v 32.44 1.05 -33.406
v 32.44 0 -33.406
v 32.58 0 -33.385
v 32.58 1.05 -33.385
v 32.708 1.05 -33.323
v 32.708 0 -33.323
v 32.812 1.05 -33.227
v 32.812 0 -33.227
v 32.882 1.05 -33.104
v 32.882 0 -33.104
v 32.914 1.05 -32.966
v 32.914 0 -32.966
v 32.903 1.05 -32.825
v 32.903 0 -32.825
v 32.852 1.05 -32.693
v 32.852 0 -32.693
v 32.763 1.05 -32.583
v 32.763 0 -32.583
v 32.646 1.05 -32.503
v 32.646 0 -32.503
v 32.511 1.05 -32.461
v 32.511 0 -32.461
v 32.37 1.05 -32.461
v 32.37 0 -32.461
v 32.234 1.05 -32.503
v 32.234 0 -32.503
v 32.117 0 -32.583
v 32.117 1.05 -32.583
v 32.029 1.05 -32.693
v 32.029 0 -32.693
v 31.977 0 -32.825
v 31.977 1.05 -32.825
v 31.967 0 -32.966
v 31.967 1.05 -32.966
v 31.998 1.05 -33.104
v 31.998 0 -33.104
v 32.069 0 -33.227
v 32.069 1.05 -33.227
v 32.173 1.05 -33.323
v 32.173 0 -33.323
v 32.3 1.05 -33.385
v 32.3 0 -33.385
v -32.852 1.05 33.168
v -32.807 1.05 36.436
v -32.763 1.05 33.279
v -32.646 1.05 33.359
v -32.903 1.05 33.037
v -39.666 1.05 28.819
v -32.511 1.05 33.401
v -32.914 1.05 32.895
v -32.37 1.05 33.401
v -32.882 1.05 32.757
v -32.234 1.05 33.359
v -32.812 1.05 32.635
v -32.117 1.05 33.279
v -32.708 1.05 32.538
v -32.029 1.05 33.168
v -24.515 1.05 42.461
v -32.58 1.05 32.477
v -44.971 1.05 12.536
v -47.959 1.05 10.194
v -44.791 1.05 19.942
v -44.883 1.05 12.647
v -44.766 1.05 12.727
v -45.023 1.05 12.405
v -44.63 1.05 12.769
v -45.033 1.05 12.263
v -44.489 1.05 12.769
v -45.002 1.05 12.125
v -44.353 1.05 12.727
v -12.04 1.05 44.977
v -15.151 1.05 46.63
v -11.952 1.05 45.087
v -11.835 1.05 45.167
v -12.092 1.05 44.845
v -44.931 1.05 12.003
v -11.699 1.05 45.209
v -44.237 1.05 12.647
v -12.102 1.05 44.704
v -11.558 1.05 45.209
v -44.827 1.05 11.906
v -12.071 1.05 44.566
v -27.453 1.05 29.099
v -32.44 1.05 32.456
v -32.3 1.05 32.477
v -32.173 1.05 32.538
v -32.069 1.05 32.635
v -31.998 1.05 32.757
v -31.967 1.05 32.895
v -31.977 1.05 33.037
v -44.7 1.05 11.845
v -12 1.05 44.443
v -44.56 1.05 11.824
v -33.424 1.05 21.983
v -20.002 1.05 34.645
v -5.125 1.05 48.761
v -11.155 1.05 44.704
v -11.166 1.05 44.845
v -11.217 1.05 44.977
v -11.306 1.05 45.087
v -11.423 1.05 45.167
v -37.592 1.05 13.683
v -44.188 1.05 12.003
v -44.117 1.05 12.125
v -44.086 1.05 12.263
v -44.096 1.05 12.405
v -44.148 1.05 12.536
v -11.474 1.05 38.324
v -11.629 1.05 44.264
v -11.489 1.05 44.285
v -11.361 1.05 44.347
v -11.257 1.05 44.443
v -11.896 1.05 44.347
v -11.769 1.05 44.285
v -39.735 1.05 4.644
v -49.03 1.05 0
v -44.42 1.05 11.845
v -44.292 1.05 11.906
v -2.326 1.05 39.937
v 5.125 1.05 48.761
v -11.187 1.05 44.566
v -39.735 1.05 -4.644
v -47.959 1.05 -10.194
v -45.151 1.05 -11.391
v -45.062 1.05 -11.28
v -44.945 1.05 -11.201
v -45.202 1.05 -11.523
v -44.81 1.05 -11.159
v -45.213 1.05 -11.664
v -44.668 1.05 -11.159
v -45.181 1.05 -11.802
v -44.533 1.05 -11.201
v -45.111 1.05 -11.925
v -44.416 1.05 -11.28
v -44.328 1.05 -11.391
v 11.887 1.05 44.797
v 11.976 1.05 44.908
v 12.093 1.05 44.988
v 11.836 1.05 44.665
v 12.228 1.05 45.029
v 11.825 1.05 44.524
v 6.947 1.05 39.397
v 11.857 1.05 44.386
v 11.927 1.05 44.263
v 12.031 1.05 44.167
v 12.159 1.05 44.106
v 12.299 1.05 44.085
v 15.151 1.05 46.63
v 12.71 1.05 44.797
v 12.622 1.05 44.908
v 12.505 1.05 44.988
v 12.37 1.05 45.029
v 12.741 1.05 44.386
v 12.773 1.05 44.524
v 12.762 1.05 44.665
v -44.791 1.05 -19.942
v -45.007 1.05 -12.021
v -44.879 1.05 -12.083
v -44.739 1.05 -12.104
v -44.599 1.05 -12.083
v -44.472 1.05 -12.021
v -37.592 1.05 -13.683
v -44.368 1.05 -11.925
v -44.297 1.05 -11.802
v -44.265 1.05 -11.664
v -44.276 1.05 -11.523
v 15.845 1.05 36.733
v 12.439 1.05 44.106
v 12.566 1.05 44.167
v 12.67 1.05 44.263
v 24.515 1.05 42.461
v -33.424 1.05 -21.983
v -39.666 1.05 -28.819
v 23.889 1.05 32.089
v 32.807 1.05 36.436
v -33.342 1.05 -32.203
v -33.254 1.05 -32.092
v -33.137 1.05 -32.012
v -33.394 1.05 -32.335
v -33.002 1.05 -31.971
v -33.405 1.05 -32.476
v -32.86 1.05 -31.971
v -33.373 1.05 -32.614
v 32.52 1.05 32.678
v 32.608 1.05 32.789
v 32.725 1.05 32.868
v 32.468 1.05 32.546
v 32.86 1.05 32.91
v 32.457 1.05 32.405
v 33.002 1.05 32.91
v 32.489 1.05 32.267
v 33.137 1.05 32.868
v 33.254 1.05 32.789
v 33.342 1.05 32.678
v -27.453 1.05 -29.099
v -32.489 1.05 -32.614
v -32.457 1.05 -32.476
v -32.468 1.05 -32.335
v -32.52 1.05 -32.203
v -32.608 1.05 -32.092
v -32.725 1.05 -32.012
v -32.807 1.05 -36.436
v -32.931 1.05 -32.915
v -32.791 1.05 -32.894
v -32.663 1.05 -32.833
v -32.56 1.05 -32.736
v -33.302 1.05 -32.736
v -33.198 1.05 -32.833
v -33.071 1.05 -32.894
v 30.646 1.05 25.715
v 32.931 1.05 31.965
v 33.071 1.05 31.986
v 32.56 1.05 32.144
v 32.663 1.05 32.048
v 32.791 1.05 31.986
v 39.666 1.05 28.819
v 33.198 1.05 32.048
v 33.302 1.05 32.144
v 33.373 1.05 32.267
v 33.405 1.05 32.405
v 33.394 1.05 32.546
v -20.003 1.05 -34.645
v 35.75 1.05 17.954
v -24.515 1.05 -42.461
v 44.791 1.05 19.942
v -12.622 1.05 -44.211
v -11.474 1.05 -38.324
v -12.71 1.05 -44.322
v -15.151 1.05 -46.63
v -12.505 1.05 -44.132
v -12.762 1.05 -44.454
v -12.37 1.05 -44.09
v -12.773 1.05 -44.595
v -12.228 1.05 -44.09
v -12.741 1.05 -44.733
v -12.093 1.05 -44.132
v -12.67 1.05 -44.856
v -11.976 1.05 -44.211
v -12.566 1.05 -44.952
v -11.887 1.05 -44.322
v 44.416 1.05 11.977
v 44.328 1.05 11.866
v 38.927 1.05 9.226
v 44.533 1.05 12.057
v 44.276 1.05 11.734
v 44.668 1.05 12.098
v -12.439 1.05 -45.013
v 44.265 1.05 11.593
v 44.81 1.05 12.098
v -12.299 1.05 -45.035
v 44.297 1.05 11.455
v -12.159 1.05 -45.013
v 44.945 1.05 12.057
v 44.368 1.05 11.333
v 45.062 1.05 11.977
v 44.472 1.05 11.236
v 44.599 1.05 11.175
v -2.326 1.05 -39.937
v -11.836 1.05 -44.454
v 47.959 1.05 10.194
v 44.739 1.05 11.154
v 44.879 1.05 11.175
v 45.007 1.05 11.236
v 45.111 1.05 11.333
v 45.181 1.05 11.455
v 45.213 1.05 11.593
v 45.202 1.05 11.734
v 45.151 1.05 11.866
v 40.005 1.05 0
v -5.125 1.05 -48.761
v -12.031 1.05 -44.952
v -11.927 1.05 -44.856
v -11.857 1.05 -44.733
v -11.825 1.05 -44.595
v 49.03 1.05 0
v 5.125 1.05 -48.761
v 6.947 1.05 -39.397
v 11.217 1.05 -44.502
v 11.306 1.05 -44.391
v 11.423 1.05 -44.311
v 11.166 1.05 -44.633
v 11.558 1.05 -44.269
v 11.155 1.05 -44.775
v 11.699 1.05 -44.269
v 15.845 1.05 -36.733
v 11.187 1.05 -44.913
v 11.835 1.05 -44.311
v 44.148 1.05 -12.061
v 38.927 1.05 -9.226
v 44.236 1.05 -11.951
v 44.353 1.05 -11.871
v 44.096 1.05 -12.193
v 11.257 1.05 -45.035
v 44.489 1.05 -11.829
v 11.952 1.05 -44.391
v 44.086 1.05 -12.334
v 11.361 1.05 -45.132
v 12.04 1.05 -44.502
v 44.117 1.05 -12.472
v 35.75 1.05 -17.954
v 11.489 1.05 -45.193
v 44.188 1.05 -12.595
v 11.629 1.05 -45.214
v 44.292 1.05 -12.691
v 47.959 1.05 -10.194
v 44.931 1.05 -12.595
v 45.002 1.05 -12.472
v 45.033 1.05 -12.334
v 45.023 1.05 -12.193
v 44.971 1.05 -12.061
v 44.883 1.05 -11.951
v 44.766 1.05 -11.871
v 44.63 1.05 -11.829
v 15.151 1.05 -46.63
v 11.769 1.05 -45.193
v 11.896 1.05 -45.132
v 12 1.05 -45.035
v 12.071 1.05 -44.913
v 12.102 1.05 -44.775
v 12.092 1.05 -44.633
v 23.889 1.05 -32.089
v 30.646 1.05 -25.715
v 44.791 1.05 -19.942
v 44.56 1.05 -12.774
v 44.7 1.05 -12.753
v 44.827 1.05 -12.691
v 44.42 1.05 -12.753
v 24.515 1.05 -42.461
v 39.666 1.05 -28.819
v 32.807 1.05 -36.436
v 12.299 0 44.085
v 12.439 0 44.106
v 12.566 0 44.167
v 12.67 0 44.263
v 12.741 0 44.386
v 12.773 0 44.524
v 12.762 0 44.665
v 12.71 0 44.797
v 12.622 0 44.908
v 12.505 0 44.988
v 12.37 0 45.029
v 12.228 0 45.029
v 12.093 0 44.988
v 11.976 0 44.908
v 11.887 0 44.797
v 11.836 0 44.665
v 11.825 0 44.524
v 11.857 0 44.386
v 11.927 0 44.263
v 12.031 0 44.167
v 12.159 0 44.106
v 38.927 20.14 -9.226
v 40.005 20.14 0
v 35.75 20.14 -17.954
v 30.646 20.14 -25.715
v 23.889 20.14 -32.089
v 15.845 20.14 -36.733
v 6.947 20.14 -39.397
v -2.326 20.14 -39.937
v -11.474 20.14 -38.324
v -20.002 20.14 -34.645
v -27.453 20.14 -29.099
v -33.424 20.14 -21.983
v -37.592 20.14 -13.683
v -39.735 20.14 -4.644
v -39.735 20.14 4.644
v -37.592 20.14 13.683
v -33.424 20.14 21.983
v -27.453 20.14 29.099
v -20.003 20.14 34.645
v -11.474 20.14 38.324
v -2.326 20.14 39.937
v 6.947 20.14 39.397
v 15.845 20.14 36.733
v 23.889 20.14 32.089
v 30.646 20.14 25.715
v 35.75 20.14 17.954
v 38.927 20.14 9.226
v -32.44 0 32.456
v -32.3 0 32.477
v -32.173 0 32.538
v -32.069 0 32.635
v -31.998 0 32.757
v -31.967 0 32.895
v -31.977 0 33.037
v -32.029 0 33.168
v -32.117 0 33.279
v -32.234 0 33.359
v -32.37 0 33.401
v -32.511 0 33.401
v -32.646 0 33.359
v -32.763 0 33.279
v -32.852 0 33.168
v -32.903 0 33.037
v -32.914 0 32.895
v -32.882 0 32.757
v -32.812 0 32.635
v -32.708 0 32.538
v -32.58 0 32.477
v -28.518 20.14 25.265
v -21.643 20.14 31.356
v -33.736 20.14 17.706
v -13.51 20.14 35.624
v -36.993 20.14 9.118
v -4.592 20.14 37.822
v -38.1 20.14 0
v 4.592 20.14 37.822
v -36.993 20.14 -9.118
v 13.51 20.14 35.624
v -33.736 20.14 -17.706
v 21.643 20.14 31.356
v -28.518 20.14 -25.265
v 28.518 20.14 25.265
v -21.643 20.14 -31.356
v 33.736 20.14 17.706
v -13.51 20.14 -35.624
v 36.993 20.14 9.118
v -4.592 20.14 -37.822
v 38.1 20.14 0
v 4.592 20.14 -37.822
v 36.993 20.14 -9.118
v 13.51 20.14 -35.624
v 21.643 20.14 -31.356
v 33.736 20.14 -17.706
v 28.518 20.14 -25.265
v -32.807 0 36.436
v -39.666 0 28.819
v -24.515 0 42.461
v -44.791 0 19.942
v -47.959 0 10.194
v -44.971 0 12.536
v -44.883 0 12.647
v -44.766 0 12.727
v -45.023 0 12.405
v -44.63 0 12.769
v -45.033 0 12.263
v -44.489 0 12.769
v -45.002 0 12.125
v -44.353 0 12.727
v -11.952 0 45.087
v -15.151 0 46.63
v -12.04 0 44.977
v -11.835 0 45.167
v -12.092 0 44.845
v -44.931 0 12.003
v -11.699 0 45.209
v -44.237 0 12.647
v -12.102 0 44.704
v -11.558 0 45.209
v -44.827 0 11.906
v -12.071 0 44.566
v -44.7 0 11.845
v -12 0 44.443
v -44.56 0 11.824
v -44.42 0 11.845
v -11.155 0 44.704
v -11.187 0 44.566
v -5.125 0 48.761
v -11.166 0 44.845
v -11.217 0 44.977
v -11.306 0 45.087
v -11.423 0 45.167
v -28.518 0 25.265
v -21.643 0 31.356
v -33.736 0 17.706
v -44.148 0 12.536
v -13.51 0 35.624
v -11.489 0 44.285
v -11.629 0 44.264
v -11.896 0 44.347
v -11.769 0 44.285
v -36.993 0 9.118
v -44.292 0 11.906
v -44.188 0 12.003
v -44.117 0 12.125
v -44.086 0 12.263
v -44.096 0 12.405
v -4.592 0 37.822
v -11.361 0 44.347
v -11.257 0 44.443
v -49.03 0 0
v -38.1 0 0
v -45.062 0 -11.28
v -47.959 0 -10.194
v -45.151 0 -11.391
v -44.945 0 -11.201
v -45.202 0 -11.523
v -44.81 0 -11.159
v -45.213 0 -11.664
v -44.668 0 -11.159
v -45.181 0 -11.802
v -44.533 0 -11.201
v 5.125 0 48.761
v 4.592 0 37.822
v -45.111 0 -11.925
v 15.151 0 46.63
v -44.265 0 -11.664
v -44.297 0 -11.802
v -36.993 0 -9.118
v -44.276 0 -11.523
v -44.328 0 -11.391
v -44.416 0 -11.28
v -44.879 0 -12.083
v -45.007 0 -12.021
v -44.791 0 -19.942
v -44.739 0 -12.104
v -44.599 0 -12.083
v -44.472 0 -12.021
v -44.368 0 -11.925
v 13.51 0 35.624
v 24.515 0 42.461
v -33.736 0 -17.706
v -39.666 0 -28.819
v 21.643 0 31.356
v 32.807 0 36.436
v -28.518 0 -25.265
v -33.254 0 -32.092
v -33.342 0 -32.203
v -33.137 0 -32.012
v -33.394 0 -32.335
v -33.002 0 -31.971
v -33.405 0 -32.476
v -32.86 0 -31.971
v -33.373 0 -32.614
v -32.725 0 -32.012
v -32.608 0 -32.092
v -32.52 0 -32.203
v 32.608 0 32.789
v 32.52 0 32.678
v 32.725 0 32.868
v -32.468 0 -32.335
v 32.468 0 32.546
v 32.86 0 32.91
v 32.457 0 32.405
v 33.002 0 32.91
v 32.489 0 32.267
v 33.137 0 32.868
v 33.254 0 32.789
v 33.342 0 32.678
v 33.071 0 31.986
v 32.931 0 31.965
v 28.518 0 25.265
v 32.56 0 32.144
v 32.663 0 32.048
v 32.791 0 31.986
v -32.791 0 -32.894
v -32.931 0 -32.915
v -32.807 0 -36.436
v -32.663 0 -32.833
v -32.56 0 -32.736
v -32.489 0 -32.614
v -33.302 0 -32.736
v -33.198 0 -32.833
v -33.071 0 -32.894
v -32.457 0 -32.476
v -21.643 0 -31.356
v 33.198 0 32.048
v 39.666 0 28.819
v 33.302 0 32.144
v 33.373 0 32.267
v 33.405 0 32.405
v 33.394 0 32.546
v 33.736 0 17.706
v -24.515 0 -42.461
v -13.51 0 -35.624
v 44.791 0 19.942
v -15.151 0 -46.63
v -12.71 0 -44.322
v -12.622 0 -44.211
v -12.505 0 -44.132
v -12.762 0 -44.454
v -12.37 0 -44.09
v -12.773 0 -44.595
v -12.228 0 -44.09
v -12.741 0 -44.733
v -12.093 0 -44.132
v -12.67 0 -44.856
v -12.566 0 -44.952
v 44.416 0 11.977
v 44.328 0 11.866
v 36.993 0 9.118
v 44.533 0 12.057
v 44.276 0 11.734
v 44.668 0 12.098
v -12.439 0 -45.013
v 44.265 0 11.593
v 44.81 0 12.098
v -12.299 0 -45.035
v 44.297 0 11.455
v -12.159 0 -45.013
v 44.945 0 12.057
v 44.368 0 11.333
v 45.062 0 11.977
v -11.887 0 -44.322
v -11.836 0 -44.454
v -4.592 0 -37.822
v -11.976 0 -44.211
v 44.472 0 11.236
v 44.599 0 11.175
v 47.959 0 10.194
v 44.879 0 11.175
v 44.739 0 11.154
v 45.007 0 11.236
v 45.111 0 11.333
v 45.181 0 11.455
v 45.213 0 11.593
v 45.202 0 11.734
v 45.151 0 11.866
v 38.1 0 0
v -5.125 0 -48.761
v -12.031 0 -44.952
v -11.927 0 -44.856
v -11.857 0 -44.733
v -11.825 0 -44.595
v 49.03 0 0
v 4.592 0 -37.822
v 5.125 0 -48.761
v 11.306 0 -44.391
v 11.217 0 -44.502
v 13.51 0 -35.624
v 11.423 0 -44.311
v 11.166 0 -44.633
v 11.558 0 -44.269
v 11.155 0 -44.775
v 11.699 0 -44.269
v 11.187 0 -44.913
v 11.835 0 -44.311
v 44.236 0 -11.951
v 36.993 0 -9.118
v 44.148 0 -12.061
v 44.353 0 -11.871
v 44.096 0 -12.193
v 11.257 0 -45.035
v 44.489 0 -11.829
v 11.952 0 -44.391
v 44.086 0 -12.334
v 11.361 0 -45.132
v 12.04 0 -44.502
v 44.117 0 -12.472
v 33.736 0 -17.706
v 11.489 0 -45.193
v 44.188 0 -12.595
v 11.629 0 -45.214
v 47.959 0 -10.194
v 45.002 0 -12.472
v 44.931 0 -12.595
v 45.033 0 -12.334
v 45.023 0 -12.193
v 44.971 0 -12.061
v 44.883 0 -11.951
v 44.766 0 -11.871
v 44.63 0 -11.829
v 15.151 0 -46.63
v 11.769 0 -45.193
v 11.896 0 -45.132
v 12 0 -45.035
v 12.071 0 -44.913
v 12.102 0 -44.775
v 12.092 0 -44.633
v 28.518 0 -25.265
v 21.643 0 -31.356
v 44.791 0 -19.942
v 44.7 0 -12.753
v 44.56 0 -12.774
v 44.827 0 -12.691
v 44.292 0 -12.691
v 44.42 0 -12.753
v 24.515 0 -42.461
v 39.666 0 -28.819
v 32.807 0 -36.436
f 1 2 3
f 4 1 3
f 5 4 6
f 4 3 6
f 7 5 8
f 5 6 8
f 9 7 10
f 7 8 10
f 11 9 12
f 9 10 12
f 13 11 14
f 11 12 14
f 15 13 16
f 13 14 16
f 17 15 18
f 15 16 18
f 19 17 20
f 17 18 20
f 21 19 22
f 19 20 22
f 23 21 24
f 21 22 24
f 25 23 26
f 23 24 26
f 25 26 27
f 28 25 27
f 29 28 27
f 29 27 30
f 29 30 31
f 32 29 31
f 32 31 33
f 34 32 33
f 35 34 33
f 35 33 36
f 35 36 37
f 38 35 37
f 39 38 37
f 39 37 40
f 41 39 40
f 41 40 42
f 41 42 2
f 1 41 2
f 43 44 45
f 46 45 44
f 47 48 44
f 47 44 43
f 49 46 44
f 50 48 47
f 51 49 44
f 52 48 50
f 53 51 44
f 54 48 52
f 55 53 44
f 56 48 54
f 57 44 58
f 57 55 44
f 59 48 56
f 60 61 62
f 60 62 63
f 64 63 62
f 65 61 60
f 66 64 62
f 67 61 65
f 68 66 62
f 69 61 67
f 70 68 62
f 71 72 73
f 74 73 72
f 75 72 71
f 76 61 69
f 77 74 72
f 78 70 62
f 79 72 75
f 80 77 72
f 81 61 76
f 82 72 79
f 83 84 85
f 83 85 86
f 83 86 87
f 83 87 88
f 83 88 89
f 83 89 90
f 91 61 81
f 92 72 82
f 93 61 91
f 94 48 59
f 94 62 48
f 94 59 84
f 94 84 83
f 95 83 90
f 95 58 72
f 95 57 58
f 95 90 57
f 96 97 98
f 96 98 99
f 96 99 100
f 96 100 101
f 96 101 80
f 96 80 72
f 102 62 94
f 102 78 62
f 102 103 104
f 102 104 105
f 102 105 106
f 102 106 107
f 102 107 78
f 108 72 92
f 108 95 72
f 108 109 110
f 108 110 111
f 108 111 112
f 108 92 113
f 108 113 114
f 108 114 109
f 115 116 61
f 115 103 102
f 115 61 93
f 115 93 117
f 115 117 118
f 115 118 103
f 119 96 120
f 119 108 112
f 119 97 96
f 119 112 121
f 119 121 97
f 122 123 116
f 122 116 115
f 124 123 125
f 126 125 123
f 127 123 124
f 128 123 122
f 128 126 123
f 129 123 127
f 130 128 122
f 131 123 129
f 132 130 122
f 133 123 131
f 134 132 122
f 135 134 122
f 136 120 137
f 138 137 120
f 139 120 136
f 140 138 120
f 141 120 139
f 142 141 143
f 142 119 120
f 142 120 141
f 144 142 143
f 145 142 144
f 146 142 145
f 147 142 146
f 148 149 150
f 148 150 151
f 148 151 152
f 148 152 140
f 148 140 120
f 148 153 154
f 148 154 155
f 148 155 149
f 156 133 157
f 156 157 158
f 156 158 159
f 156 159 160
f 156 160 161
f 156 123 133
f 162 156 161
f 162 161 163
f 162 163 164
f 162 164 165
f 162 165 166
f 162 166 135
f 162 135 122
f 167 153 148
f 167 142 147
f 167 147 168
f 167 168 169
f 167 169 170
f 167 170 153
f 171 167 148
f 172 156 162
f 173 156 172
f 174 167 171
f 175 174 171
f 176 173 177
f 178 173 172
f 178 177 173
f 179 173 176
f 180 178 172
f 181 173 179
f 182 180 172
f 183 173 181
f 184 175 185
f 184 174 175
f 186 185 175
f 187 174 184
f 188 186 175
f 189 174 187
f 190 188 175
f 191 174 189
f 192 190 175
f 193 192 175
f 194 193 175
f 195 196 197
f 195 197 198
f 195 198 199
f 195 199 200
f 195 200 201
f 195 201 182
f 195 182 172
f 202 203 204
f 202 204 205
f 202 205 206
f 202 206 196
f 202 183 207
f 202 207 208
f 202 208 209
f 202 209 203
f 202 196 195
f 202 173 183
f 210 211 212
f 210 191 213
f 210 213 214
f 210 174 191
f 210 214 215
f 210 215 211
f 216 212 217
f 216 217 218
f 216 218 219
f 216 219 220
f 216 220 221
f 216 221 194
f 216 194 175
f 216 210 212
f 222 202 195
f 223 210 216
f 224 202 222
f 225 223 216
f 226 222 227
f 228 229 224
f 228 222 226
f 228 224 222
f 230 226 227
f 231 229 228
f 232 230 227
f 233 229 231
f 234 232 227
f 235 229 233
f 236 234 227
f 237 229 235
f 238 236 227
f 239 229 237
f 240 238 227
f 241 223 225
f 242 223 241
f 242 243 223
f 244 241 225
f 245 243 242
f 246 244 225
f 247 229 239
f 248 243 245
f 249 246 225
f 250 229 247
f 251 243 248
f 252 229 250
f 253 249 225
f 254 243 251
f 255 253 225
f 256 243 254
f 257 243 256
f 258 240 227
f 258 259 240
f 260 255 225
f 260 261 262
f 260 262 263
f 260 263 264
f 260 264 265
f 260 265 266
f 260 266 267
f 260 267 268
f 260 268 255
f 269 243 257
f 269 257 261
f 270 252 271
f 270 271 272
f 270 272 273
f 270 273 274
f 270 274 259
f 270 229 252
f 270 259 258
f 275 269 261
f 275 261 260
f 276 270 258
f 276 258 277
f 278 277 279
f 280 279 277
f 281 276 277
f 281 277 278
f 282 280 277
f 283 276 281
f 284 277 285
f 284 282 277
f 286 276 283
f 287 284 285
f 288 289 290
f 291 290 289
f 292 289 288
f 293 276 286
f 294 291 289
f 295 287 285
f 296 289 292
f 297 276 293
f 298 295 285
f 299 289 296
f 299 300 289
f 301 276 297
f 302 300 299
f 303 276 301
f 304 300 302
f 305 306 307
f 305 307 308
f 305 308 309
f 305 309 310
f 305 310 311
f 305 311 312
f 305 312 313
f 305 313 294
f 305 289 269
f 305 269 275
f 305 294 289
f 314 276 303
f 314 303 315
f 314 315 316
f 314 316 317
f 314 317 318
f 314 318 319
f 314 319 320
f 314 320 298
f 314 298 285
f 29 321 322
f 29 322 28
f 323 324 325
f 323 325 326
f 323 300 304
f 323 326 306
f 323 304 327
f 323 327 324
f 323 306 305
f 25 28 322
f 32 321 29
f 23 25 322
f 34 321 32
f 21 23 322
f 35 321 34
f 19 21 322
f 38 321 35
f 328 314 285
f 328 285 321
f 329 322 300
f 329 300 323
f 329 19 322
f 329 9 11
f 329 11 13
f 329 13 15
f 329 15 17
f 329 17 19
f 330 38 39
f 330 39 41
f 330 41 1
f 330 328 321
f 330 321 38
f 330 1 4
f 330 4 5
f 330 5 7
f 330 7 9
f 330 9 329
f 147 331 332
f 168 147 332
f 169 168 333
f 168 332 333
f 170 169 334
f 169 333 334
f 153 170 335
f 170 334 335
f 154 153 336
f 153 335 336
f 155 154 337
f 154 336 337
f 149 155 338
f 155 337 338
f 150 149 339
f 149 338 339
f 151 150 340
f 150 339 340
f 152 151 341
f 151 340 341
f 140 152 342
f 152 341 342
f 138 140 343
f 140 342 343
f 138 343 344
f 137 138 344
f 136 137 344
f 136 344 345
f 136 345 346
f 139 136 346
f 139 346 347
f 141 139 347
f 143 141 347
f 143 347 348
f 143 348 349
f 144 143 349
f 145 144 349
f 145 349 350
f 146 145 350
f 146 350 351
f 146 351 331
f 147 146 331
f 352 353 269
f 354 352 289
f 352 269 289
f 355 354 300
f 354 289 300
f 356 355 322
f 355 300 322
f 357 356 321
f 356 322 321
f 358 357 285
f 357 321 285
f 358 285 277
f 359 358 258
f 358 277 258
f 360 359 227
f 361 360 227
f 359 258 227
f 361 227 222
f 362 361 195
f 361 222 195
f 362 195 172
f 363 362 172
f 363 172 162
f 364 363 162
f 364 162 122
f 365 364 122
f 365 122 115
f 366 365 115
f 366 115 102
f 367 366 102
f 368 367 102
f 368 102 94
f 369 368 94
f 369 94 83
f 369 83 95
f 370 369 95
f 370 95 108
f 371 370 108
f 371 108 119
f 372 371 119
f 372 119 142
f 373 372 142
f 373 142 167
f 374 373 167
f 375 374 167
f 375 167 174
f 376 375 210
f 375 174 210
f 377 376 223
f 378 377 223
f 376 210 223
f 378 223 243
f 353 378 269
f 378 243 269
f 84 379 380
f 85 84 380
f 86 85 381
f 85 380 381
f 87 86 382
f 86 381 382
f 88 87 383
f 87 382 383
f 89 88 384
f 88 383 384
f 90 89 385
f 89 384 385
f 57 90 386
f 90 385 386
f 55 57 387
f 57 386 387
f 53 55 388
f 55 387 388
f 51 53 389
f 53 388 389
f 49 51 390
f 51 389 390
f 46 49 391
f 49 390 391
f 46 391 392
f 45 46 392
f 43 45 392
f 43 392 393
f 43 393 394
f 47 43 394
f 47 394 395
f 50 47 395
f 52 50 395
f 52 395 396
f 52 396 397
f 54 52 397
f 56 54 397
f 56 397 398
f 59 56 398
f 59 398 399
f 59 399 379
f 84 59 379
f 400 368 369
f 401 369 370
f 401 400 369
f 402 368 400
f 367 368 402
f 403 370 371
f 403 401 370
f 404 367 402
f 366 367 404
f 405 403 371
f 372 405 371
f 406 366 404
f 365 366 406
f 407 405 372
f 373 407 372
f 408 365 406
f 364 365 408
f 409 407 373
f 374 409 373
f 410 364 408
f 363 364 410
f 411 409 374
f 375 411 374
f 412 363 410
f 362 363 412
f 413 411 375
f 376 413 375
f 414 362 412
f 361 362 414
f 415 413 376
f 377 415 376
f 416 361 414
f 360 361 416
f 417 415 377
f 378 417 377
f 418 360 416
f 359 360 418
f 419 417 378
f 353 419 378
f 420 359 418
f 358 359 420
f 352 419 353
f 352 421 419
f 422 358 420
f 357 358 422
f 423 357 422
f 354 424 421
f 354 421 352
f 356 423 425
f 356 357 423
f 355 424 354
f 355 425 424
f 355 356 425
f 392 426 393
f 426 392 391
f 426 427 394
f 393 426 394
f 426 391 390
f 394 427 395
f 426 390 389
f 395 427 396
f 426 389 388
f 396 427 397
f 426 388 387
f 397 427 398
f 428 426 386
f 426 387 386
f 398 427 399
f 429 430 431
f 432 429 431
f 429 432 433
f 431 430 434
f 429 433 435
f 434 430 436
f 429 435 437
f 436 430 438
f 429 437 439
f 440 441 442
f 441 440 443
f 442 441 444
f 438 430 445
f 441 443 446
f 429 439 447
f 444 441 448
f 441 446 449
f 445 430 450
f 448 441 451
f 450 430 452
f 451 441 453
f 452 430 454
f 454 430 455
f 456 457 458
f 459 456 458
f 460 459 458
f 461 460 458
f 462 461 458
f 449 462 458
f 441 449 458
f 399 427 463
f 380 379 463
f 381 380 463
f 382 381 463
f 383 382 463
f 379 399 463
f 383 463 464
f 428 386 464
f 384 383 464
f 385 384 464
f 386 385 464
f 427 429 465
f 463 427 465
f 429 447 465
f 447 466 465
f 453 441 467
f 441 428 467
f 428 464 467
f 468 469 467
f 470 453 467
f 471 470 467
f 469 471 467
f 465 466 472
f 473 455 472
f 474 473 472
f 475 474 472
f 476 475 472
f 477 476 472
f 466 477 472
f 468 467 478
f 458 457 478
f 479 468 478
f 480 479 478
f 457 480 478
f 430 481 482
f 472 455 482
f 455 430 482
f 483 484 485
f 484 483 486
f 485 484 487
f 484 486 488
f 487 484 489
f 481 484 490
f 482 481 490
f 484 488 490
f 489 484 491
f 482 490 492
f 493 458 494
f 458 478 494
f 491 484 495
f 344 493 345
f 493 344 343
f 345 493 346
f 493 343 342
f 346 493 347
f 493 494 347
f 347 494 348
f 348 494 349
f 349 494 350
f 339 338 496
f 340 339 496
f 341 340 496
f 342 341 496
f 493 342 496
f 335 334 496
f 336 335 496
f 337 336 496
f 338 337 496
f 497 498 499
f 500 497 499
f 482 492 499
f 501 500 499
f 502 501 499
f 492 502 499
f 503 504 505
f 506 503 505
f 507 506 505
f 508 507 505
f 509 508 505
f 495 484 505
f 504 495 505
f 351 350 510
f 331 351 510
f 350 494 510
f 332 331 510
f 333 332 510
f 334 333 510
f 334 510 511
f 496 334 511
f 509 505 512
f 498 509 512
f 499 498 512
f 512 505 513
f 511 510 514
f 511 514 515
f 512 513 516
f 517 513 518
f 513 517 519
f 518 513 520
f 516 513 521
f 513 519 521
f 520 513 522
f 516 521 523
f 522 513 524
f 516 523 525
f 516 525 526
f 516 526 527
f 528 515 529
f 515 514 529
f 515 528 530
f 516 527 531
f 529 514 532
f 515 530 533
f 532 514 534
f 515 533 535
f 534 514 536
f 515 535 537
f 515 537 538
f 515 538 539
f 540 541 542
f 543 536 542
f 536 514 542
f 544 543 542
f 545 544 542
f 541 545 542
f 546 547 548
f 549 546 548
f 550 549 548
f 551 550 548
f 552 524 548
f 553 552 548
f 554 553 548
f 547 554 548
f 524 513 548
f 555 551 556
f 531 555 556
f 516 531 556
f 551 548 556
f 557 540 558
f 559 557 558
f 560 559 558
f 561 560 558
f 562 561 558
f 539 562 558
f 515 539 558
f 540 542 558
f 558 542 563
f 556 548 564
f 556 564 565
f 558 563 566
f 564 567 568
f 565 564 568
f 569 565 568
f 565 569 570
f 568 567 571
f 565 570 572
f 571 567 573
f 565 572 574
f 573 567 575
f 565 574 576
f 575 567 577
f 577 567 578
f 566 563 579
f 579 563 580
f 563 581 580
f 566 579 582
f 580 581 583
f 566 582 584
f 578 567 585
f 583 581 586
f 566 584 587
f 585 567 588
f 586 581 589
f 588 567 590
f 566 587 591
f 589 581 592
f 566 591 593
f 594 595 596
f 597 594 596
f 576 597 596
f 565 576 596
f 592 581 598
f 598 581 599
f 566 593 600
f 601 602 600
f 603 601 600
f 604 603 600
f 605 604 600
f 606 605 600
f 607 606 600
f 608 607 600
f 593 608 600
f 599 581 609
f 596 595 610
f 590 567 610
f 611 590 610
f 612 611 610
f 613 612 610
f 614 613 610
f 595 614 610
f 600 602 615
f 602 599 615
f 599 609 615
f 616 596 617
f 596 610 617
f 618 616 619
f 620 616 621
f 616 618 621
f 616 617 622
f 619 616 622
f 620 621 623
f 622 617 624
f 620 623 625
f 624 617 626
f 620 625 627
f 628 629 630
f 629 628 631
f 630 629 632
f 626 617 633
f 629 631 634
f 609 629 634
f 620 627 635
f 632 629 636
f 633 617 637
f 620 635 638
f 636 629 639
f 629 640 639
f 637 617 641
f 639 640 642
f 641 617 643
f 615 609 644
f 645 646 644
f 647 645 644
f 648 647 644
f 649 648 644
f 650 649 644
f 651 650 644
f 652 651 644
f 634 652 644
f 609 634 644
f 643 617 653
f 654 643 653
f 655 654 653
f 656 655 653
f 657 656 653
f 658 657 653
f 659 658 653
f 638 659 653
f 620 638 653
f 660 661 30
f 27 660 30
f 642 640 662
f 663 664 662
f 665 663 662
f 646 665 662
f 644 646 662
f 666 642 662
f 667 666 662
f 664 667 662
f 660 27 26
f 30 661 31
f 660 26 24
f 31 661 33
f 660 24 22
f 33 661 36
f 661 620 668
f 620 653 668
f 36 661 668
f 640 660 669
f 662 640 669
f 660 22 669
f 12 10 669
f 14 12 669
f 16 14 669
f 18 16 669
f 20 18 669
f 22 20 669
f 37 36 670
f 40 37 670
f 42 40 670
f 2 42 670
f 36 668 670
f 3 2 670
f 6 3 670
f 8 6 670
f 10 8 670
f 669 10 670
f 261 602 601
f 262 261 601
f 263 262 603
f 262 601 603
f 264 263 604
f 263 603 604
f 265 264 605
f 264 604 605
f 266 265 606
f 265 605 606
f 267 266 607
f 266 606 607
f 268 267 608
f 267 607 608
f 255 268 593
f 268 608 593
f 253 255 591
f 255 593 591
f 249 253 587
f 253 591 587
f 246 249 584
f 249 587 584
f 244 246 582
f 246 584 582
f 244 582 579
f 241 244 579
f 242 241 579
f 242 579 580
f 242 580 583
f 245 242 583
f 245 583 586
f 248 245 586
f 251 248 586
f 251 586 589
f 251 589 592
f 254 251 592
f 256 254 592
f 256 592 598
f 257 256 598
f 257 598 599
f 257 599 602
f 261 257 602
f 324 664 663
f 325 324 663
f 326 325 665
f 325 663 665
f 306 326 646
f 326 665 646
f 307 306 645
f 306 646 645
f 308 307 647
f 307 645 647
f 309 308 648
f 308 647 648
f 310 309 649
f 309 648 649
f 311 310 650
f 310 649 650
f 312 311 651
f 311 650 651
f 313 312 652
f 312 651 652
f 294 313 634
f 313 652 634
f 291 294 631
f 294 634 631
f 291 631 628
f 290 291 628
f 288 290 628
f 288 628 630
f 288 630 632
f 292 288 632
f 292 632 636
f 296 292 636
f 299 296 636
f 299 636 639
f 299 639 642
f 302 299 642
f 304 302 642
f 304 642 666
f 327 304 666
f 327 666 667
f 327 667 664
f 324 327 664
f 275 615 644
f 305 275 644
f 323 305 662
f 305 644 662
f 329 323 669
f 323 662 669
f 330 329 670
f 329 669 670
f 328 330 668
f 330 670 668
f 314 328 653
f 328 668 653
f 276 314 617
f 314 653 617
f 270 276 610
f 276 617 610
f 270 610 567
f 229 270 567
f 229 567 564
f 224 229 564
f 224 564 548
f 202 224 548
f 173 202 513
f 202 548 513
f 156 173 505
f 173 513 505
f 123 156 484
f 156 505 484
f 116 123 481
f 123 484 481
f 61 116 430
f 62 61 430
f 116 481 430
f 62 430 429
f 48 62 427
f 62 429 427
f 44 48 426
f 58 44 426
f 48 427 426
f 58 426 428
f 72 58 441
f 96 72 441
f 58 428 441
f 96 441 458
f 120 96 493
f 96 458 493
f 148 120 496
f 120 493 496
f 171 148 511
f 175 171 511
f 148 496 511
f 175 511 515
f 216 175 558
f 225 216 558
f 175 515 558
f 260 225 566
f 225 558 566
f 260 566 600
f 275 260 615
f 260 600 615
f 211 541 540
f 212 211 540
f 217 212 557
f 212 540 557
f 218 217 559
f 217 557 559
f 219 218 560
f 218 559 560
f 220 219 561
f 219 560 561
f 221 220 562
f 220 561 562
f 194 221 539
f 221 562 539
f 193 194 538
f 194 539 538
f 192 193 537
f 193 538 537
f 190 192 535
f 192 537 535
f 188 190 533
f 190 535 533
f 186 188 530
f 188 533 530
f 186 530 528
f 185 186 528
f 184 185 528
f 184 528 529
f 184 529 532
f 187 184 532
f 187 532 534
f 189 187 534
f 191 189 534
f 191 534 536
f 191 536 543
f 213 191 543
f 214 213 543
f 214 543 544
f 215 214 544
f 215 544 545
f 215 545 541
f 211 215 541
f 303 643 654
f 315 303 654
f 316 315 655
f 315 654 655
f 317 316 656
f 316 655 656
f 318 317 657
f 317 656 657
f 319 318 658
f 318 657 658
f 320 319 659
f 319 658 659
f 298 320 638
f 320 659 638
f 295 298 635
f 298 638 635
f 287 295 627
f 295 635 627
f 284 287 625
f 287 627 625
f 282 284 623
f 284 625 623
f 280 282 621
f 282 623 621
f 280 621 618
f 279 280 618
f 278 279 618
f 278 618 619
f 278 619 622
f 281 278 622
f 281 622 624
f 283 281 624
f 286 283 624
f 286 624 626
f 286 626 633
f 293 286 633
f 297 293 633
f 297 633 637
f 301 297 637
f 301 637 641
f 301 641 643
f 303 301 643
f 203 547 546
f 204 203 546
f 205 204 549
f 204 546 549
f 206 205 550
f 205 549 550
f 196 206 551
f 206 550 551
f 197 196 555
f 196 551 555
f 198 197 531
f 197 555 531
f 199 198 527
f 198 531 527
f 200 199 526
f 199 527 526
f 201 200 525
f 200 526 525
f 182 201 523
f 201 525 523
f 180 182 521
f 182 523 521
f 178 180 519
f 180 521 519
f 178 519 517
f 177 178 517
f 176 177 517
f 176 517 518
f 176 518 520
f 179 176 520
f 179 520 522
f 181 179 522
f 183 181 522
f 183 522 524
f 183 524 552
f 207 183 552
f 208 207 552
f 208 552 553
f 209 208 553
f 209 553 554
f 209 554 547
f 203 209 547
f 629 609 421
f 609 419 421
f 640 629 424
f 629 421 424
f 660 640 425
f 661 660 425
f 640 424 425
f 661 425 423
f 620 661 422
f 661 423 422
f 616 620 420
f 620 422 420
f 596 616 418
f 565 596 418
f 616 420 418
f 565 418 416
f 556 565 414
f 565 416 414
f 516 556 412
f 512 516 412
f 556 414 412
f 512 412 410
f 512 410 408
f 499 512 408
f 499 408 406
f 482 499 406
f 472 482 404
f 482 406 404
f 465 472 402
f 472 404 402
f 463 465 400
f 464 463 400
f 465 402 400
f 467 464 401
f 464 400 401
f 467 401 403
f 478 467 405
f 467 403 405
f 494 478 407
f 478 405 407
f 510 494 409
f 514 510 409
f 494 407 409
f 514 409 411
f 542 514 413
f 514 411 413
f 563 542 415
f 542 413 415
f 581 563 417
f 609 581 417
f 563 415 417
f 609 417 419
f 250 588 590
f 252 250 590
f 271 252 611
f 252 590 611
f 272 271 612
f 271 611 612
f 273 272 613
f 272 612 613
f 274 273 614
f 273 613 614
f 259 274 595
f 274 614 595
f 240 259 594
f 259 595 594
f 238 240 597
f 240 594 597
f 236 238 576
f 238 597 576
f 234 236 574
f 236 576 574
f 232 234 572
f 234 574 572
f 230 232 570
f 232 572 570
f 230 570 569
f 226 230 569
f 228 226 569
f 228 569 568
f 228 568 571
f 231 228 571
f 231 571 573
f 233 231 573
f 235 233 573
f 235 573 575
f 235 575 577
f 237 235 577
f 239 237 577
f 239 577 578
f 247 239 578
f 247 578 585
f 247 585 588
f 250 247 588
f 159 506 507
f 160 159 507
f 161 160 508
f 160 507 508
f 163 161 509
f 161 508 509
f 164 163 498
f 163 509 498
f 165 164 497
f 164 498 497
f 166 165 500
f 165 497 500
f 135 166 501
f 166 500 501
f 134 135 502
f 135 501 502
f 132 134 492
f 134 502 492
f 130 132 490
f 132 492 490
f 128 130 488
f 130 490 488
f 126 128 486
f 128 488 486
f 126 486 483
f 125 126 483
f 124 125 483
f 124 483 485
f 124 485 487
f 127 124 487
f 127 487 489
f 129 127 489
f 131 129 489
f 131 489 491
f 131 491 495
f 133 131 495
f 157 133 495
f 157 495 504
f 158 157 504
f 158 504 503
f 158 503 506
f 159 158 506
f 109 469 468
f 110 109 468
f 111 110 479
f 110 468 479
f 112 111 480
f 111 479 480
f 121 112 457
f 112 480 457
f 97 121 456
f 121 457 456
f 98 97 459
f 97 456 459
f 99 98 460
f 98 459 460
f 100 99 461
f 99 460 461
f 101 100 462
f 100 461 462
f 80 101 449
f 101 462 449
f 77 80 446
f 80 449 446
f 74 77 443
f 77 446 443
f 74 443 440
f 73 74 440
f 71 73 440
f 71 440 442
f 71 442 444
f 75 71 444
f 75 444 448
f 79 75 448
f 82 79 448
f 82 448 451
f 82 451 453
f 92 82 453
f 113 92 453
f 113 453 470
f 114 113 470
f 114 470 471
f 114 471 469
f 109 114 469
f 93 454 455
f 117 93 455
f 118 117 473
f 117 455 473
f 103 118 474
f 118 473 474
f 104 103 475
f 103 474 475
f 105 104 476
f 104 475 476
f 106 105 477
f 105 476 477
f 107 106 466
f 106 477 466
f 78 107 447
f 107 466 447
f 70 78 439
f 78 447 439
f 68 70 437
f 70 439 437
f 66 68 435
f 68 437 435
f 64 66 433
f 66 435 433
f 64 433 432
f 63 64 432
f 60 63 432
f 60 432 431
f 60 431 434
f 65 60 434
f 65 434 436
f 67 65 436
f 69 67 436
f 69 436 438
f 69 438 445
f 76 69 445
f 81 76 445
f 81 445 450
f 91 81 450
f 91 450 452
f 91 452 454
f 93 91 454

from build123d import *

# Parameters (mm, degrees)
SKETCH3_R                = 40.005
BOSS_EXTRUDE1_DEPTH      = 20.14
SKETCH4_R                = 38.1
CUT_EXTRUDE1_DEPTH       = 20.14
SKETCH2_R                = 49.03
BOSS_EXTRUDE2_DEPTH      = 1.05
SKETCH6_R                = 38.1
CUT_EXTRUDE2_DEPTH       = 1.05
M1_2X0_25_TAPPED_HOLE2_D = 0.95


with BuildPart() as part:
    # Sketch3 → Boss-Extrude1 (new body)
    with BuildSketch(Plane(origin=(0, 0, 0), x_dir=(1, 0, 0), z_dir=(0, 1, 0))):
        Circle(SKETCH3_R)
    extrude(amount=BOSS_EXTRUDE1_DEPTH)

    # Sketch4 → Cut-Extrude1 (cut)
    with BuildSketch(Plane(origin=(0, 20.14, 0), x_dir=(1, 0, 0), z_dir=(0, 1, 0))):
        Circle(SKETCH4_R)
    extrude(amount=-CUT_EXTRUDE1_DEPTH, mode=Mode.SUBTRACT)

    # Sketch2 → Boss-Extrude2 (add)
    with BuildSketch(Plane(origin=(0, 0, 0), x_dir=(1, 0, 0), z_dir=(0, 1, 0))):
        Circle(SKETCH2_R)
    extrude(amount=BOSS_EXTRUDE2_DEPTH)

    # Sketch6 → Cut-Extrude2 (cut)
    with BuildSketch(Plane(origin=(0, 1.05, 0), x_dir=(1, 0, 0), z_dir=(0, 1, 0))):
        Circle(SKETCH6_R)
    extrude(amount=-CUT_EXTRUDE2_DEPTH, mode=Mode.SUBTRACT)

    # M1.2x0.25 Tapped Hole2 (through all)
    with Locations(Plane(origin=(-12.298859085, 1.05, -44.559581921), x_dir=(0, 0, 1), z_dir=(0, 1, 0))):
        with Locations((0, 0), (-0.179575061, 23.927525232), (11.62866746, 44.739161663), (32.260724597, 56.858437128), (56.188247767, 57.038018412), (76.999884487, 45.229773054), (89.119161163, 24.597717695), (89.298738325, 0.670192913), (77.49049699, -20.141443547), (56.858440891, -32.260723471), (32.930915763, -32.440301841), (12.119282142, -20.63205416)):
            Hole(M1_2X0_25_TAPPED_HOLE2_D / 2)


solid = part.part
